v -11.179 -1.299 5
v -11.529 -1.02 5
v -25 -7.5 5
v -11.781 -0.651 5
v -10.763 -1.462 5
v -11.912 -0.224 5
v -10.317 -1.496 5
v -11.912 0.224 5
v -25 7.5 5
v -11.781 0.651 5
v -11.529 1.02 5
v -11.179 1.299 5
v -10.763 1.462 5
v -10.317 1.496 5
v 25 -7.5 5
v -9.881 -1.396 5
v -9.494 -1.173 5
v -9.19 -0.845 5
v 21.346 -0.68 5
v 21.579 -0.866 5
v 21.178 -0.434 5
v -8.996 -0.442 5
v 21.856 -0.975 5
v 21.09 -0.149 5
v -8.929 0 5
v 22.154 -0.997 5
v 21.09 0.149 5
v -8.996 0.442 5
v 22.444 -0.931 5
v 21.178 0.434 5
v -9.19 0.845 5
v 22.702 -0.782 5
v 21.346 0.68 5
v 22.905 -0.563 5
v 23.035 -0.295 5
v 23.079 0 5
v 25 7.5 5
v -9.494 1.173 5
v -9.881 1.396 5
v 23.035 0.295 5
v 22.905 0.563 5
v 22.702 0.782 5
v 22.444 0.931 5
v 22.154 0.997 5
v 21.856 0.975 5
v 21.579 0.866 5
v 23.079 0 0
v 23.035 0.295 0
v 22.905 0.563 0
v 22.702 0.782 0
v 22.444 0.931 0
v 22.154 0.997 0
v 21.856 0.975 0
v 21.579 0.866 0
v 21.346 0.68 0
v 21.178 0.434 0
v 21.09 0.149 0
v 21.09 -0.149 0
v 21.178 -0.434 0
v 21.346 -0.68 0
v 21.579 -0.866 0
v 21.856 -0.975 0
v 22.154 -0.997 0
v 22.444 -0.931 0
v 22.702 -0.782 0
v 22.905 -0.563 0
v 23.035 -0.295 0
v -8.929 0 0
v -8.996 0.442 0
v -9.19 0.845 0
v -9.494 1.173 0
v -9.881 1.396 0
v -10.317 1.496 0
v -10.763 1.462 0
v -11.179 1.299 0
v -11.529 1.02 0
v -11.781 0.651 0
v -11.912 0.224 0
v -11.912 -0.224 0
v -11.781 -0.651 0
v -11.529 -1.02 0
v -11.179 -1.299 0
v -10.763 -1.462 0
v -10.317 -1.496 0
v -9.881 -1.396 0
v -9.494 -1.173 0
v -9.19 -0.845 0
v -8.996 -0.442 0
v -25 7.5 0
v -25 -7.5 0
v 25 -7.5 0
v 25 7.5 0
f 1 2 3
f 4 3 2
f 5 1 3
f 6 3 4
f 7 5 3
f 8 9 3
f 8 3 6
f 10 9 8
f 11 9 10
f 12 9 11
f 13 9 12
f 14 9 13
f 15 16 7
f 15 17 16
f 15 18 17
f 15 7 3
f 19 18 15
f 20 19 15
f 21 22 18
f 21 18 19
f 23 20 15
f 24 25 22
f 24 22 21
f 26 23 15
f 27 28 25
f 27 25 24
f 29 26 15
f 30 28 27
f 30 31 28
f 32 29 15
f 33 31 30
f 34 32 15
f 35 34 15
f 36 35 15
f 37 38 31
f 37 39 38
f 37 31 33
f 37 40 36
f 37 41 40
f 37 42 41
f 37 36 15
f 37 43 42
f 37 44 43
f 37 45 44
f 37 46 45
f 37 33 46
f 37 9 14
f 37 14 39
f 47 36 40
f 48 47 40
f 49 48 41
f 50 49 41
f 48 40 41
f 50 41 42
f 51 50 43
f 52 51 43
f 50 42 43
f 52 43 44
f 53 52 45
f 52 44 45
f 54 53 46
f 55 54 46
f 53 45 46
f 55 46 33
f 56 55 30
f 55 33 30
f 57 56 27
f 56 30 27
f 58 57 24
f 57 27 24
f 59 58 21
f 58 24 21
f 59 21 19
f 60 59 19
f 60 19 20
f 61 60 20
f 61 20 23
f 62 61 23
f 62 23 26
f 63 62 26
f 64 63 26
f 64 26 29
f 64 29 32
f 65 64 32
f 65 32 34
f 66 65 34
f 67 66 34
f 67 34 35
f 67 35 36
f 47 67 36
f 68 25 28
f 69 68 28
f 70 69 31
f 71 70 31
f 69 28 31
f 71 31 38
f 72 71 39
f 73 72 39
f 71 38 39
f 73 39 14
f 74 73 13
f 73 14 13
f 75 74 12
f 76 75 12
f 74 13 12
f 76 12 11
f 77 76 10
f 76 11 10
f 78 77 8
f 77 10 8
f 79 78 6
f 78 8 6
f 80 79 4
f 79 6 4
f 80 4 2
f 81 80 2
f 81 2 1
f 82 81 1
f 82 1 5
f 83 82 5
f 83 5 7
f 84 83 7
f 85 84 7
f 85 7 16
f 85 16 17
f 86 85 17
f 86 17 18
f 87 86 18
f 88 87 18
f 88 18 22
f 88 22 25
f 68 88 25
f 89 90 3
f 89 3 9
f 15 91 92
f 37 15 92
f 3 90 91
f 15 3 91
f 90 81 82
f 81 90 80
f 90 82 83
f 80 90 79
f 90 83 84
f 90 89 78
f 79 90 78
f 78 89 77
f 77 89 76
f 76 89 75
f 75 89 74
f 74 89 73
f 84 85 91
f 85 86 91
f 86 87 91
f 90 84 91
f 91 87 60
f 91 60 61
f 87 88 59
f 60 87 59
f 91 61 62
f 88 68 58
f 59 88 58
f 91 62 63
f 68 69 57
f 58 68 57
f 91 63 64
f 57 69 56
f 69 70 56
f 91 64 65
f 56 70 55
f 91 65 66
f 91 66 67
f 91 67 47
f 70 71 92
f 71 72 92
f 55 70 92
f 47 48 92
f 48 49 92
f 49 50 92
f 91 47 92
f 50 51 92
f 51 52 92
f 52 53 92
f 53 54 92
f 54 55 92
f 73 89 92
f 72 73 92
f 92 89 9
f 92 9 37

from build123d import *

# Parameters (mm, degrees)
SKETCH2_W           = 50
SKETCH2_H           = 15
BOSS_EXTRUDE1_DEPTH = 5
SKETCH3_R           = 1.5
CUT_EXTRUDE1_DEPTH  = 6
SKETCH4_R           = 1
CUT_EXTRUDE2_DEPTH  = 6


with BuildPart() as part:
    # Sketch2 → Boss-Extrude1 (new body)
    with BuildSketch(Plane.XY):
        Rectangle(SKETCH2_W, SKETCH2_H)
    extrude(amount=BOSS_EXTRUDE1_DEPTH)

    # Sketch3 → Cut-Extrude1 (cut, through all)
    with BuildSketch(Plane.XY.offset(5)):
        with Locations((-10.429188339, 0)):
            Circle(SKETCH3_R)
    extrude(amount=-CUT_EXTRUDE1_DEPTH, mode=Mode.SUBTRACT)

    # Sketch4 → Cut-Extrude2 (cut, through all)
    with BuildSketch(Plane.XY.offset(5)):
        with Locations((22.078934641, 0)):
            Circle(SKETCH4_R)
    extrude(amount=-CUT_EXTRUDE2_DEPTH, mode=Mode.SUBTRACT)


solid = part.part
